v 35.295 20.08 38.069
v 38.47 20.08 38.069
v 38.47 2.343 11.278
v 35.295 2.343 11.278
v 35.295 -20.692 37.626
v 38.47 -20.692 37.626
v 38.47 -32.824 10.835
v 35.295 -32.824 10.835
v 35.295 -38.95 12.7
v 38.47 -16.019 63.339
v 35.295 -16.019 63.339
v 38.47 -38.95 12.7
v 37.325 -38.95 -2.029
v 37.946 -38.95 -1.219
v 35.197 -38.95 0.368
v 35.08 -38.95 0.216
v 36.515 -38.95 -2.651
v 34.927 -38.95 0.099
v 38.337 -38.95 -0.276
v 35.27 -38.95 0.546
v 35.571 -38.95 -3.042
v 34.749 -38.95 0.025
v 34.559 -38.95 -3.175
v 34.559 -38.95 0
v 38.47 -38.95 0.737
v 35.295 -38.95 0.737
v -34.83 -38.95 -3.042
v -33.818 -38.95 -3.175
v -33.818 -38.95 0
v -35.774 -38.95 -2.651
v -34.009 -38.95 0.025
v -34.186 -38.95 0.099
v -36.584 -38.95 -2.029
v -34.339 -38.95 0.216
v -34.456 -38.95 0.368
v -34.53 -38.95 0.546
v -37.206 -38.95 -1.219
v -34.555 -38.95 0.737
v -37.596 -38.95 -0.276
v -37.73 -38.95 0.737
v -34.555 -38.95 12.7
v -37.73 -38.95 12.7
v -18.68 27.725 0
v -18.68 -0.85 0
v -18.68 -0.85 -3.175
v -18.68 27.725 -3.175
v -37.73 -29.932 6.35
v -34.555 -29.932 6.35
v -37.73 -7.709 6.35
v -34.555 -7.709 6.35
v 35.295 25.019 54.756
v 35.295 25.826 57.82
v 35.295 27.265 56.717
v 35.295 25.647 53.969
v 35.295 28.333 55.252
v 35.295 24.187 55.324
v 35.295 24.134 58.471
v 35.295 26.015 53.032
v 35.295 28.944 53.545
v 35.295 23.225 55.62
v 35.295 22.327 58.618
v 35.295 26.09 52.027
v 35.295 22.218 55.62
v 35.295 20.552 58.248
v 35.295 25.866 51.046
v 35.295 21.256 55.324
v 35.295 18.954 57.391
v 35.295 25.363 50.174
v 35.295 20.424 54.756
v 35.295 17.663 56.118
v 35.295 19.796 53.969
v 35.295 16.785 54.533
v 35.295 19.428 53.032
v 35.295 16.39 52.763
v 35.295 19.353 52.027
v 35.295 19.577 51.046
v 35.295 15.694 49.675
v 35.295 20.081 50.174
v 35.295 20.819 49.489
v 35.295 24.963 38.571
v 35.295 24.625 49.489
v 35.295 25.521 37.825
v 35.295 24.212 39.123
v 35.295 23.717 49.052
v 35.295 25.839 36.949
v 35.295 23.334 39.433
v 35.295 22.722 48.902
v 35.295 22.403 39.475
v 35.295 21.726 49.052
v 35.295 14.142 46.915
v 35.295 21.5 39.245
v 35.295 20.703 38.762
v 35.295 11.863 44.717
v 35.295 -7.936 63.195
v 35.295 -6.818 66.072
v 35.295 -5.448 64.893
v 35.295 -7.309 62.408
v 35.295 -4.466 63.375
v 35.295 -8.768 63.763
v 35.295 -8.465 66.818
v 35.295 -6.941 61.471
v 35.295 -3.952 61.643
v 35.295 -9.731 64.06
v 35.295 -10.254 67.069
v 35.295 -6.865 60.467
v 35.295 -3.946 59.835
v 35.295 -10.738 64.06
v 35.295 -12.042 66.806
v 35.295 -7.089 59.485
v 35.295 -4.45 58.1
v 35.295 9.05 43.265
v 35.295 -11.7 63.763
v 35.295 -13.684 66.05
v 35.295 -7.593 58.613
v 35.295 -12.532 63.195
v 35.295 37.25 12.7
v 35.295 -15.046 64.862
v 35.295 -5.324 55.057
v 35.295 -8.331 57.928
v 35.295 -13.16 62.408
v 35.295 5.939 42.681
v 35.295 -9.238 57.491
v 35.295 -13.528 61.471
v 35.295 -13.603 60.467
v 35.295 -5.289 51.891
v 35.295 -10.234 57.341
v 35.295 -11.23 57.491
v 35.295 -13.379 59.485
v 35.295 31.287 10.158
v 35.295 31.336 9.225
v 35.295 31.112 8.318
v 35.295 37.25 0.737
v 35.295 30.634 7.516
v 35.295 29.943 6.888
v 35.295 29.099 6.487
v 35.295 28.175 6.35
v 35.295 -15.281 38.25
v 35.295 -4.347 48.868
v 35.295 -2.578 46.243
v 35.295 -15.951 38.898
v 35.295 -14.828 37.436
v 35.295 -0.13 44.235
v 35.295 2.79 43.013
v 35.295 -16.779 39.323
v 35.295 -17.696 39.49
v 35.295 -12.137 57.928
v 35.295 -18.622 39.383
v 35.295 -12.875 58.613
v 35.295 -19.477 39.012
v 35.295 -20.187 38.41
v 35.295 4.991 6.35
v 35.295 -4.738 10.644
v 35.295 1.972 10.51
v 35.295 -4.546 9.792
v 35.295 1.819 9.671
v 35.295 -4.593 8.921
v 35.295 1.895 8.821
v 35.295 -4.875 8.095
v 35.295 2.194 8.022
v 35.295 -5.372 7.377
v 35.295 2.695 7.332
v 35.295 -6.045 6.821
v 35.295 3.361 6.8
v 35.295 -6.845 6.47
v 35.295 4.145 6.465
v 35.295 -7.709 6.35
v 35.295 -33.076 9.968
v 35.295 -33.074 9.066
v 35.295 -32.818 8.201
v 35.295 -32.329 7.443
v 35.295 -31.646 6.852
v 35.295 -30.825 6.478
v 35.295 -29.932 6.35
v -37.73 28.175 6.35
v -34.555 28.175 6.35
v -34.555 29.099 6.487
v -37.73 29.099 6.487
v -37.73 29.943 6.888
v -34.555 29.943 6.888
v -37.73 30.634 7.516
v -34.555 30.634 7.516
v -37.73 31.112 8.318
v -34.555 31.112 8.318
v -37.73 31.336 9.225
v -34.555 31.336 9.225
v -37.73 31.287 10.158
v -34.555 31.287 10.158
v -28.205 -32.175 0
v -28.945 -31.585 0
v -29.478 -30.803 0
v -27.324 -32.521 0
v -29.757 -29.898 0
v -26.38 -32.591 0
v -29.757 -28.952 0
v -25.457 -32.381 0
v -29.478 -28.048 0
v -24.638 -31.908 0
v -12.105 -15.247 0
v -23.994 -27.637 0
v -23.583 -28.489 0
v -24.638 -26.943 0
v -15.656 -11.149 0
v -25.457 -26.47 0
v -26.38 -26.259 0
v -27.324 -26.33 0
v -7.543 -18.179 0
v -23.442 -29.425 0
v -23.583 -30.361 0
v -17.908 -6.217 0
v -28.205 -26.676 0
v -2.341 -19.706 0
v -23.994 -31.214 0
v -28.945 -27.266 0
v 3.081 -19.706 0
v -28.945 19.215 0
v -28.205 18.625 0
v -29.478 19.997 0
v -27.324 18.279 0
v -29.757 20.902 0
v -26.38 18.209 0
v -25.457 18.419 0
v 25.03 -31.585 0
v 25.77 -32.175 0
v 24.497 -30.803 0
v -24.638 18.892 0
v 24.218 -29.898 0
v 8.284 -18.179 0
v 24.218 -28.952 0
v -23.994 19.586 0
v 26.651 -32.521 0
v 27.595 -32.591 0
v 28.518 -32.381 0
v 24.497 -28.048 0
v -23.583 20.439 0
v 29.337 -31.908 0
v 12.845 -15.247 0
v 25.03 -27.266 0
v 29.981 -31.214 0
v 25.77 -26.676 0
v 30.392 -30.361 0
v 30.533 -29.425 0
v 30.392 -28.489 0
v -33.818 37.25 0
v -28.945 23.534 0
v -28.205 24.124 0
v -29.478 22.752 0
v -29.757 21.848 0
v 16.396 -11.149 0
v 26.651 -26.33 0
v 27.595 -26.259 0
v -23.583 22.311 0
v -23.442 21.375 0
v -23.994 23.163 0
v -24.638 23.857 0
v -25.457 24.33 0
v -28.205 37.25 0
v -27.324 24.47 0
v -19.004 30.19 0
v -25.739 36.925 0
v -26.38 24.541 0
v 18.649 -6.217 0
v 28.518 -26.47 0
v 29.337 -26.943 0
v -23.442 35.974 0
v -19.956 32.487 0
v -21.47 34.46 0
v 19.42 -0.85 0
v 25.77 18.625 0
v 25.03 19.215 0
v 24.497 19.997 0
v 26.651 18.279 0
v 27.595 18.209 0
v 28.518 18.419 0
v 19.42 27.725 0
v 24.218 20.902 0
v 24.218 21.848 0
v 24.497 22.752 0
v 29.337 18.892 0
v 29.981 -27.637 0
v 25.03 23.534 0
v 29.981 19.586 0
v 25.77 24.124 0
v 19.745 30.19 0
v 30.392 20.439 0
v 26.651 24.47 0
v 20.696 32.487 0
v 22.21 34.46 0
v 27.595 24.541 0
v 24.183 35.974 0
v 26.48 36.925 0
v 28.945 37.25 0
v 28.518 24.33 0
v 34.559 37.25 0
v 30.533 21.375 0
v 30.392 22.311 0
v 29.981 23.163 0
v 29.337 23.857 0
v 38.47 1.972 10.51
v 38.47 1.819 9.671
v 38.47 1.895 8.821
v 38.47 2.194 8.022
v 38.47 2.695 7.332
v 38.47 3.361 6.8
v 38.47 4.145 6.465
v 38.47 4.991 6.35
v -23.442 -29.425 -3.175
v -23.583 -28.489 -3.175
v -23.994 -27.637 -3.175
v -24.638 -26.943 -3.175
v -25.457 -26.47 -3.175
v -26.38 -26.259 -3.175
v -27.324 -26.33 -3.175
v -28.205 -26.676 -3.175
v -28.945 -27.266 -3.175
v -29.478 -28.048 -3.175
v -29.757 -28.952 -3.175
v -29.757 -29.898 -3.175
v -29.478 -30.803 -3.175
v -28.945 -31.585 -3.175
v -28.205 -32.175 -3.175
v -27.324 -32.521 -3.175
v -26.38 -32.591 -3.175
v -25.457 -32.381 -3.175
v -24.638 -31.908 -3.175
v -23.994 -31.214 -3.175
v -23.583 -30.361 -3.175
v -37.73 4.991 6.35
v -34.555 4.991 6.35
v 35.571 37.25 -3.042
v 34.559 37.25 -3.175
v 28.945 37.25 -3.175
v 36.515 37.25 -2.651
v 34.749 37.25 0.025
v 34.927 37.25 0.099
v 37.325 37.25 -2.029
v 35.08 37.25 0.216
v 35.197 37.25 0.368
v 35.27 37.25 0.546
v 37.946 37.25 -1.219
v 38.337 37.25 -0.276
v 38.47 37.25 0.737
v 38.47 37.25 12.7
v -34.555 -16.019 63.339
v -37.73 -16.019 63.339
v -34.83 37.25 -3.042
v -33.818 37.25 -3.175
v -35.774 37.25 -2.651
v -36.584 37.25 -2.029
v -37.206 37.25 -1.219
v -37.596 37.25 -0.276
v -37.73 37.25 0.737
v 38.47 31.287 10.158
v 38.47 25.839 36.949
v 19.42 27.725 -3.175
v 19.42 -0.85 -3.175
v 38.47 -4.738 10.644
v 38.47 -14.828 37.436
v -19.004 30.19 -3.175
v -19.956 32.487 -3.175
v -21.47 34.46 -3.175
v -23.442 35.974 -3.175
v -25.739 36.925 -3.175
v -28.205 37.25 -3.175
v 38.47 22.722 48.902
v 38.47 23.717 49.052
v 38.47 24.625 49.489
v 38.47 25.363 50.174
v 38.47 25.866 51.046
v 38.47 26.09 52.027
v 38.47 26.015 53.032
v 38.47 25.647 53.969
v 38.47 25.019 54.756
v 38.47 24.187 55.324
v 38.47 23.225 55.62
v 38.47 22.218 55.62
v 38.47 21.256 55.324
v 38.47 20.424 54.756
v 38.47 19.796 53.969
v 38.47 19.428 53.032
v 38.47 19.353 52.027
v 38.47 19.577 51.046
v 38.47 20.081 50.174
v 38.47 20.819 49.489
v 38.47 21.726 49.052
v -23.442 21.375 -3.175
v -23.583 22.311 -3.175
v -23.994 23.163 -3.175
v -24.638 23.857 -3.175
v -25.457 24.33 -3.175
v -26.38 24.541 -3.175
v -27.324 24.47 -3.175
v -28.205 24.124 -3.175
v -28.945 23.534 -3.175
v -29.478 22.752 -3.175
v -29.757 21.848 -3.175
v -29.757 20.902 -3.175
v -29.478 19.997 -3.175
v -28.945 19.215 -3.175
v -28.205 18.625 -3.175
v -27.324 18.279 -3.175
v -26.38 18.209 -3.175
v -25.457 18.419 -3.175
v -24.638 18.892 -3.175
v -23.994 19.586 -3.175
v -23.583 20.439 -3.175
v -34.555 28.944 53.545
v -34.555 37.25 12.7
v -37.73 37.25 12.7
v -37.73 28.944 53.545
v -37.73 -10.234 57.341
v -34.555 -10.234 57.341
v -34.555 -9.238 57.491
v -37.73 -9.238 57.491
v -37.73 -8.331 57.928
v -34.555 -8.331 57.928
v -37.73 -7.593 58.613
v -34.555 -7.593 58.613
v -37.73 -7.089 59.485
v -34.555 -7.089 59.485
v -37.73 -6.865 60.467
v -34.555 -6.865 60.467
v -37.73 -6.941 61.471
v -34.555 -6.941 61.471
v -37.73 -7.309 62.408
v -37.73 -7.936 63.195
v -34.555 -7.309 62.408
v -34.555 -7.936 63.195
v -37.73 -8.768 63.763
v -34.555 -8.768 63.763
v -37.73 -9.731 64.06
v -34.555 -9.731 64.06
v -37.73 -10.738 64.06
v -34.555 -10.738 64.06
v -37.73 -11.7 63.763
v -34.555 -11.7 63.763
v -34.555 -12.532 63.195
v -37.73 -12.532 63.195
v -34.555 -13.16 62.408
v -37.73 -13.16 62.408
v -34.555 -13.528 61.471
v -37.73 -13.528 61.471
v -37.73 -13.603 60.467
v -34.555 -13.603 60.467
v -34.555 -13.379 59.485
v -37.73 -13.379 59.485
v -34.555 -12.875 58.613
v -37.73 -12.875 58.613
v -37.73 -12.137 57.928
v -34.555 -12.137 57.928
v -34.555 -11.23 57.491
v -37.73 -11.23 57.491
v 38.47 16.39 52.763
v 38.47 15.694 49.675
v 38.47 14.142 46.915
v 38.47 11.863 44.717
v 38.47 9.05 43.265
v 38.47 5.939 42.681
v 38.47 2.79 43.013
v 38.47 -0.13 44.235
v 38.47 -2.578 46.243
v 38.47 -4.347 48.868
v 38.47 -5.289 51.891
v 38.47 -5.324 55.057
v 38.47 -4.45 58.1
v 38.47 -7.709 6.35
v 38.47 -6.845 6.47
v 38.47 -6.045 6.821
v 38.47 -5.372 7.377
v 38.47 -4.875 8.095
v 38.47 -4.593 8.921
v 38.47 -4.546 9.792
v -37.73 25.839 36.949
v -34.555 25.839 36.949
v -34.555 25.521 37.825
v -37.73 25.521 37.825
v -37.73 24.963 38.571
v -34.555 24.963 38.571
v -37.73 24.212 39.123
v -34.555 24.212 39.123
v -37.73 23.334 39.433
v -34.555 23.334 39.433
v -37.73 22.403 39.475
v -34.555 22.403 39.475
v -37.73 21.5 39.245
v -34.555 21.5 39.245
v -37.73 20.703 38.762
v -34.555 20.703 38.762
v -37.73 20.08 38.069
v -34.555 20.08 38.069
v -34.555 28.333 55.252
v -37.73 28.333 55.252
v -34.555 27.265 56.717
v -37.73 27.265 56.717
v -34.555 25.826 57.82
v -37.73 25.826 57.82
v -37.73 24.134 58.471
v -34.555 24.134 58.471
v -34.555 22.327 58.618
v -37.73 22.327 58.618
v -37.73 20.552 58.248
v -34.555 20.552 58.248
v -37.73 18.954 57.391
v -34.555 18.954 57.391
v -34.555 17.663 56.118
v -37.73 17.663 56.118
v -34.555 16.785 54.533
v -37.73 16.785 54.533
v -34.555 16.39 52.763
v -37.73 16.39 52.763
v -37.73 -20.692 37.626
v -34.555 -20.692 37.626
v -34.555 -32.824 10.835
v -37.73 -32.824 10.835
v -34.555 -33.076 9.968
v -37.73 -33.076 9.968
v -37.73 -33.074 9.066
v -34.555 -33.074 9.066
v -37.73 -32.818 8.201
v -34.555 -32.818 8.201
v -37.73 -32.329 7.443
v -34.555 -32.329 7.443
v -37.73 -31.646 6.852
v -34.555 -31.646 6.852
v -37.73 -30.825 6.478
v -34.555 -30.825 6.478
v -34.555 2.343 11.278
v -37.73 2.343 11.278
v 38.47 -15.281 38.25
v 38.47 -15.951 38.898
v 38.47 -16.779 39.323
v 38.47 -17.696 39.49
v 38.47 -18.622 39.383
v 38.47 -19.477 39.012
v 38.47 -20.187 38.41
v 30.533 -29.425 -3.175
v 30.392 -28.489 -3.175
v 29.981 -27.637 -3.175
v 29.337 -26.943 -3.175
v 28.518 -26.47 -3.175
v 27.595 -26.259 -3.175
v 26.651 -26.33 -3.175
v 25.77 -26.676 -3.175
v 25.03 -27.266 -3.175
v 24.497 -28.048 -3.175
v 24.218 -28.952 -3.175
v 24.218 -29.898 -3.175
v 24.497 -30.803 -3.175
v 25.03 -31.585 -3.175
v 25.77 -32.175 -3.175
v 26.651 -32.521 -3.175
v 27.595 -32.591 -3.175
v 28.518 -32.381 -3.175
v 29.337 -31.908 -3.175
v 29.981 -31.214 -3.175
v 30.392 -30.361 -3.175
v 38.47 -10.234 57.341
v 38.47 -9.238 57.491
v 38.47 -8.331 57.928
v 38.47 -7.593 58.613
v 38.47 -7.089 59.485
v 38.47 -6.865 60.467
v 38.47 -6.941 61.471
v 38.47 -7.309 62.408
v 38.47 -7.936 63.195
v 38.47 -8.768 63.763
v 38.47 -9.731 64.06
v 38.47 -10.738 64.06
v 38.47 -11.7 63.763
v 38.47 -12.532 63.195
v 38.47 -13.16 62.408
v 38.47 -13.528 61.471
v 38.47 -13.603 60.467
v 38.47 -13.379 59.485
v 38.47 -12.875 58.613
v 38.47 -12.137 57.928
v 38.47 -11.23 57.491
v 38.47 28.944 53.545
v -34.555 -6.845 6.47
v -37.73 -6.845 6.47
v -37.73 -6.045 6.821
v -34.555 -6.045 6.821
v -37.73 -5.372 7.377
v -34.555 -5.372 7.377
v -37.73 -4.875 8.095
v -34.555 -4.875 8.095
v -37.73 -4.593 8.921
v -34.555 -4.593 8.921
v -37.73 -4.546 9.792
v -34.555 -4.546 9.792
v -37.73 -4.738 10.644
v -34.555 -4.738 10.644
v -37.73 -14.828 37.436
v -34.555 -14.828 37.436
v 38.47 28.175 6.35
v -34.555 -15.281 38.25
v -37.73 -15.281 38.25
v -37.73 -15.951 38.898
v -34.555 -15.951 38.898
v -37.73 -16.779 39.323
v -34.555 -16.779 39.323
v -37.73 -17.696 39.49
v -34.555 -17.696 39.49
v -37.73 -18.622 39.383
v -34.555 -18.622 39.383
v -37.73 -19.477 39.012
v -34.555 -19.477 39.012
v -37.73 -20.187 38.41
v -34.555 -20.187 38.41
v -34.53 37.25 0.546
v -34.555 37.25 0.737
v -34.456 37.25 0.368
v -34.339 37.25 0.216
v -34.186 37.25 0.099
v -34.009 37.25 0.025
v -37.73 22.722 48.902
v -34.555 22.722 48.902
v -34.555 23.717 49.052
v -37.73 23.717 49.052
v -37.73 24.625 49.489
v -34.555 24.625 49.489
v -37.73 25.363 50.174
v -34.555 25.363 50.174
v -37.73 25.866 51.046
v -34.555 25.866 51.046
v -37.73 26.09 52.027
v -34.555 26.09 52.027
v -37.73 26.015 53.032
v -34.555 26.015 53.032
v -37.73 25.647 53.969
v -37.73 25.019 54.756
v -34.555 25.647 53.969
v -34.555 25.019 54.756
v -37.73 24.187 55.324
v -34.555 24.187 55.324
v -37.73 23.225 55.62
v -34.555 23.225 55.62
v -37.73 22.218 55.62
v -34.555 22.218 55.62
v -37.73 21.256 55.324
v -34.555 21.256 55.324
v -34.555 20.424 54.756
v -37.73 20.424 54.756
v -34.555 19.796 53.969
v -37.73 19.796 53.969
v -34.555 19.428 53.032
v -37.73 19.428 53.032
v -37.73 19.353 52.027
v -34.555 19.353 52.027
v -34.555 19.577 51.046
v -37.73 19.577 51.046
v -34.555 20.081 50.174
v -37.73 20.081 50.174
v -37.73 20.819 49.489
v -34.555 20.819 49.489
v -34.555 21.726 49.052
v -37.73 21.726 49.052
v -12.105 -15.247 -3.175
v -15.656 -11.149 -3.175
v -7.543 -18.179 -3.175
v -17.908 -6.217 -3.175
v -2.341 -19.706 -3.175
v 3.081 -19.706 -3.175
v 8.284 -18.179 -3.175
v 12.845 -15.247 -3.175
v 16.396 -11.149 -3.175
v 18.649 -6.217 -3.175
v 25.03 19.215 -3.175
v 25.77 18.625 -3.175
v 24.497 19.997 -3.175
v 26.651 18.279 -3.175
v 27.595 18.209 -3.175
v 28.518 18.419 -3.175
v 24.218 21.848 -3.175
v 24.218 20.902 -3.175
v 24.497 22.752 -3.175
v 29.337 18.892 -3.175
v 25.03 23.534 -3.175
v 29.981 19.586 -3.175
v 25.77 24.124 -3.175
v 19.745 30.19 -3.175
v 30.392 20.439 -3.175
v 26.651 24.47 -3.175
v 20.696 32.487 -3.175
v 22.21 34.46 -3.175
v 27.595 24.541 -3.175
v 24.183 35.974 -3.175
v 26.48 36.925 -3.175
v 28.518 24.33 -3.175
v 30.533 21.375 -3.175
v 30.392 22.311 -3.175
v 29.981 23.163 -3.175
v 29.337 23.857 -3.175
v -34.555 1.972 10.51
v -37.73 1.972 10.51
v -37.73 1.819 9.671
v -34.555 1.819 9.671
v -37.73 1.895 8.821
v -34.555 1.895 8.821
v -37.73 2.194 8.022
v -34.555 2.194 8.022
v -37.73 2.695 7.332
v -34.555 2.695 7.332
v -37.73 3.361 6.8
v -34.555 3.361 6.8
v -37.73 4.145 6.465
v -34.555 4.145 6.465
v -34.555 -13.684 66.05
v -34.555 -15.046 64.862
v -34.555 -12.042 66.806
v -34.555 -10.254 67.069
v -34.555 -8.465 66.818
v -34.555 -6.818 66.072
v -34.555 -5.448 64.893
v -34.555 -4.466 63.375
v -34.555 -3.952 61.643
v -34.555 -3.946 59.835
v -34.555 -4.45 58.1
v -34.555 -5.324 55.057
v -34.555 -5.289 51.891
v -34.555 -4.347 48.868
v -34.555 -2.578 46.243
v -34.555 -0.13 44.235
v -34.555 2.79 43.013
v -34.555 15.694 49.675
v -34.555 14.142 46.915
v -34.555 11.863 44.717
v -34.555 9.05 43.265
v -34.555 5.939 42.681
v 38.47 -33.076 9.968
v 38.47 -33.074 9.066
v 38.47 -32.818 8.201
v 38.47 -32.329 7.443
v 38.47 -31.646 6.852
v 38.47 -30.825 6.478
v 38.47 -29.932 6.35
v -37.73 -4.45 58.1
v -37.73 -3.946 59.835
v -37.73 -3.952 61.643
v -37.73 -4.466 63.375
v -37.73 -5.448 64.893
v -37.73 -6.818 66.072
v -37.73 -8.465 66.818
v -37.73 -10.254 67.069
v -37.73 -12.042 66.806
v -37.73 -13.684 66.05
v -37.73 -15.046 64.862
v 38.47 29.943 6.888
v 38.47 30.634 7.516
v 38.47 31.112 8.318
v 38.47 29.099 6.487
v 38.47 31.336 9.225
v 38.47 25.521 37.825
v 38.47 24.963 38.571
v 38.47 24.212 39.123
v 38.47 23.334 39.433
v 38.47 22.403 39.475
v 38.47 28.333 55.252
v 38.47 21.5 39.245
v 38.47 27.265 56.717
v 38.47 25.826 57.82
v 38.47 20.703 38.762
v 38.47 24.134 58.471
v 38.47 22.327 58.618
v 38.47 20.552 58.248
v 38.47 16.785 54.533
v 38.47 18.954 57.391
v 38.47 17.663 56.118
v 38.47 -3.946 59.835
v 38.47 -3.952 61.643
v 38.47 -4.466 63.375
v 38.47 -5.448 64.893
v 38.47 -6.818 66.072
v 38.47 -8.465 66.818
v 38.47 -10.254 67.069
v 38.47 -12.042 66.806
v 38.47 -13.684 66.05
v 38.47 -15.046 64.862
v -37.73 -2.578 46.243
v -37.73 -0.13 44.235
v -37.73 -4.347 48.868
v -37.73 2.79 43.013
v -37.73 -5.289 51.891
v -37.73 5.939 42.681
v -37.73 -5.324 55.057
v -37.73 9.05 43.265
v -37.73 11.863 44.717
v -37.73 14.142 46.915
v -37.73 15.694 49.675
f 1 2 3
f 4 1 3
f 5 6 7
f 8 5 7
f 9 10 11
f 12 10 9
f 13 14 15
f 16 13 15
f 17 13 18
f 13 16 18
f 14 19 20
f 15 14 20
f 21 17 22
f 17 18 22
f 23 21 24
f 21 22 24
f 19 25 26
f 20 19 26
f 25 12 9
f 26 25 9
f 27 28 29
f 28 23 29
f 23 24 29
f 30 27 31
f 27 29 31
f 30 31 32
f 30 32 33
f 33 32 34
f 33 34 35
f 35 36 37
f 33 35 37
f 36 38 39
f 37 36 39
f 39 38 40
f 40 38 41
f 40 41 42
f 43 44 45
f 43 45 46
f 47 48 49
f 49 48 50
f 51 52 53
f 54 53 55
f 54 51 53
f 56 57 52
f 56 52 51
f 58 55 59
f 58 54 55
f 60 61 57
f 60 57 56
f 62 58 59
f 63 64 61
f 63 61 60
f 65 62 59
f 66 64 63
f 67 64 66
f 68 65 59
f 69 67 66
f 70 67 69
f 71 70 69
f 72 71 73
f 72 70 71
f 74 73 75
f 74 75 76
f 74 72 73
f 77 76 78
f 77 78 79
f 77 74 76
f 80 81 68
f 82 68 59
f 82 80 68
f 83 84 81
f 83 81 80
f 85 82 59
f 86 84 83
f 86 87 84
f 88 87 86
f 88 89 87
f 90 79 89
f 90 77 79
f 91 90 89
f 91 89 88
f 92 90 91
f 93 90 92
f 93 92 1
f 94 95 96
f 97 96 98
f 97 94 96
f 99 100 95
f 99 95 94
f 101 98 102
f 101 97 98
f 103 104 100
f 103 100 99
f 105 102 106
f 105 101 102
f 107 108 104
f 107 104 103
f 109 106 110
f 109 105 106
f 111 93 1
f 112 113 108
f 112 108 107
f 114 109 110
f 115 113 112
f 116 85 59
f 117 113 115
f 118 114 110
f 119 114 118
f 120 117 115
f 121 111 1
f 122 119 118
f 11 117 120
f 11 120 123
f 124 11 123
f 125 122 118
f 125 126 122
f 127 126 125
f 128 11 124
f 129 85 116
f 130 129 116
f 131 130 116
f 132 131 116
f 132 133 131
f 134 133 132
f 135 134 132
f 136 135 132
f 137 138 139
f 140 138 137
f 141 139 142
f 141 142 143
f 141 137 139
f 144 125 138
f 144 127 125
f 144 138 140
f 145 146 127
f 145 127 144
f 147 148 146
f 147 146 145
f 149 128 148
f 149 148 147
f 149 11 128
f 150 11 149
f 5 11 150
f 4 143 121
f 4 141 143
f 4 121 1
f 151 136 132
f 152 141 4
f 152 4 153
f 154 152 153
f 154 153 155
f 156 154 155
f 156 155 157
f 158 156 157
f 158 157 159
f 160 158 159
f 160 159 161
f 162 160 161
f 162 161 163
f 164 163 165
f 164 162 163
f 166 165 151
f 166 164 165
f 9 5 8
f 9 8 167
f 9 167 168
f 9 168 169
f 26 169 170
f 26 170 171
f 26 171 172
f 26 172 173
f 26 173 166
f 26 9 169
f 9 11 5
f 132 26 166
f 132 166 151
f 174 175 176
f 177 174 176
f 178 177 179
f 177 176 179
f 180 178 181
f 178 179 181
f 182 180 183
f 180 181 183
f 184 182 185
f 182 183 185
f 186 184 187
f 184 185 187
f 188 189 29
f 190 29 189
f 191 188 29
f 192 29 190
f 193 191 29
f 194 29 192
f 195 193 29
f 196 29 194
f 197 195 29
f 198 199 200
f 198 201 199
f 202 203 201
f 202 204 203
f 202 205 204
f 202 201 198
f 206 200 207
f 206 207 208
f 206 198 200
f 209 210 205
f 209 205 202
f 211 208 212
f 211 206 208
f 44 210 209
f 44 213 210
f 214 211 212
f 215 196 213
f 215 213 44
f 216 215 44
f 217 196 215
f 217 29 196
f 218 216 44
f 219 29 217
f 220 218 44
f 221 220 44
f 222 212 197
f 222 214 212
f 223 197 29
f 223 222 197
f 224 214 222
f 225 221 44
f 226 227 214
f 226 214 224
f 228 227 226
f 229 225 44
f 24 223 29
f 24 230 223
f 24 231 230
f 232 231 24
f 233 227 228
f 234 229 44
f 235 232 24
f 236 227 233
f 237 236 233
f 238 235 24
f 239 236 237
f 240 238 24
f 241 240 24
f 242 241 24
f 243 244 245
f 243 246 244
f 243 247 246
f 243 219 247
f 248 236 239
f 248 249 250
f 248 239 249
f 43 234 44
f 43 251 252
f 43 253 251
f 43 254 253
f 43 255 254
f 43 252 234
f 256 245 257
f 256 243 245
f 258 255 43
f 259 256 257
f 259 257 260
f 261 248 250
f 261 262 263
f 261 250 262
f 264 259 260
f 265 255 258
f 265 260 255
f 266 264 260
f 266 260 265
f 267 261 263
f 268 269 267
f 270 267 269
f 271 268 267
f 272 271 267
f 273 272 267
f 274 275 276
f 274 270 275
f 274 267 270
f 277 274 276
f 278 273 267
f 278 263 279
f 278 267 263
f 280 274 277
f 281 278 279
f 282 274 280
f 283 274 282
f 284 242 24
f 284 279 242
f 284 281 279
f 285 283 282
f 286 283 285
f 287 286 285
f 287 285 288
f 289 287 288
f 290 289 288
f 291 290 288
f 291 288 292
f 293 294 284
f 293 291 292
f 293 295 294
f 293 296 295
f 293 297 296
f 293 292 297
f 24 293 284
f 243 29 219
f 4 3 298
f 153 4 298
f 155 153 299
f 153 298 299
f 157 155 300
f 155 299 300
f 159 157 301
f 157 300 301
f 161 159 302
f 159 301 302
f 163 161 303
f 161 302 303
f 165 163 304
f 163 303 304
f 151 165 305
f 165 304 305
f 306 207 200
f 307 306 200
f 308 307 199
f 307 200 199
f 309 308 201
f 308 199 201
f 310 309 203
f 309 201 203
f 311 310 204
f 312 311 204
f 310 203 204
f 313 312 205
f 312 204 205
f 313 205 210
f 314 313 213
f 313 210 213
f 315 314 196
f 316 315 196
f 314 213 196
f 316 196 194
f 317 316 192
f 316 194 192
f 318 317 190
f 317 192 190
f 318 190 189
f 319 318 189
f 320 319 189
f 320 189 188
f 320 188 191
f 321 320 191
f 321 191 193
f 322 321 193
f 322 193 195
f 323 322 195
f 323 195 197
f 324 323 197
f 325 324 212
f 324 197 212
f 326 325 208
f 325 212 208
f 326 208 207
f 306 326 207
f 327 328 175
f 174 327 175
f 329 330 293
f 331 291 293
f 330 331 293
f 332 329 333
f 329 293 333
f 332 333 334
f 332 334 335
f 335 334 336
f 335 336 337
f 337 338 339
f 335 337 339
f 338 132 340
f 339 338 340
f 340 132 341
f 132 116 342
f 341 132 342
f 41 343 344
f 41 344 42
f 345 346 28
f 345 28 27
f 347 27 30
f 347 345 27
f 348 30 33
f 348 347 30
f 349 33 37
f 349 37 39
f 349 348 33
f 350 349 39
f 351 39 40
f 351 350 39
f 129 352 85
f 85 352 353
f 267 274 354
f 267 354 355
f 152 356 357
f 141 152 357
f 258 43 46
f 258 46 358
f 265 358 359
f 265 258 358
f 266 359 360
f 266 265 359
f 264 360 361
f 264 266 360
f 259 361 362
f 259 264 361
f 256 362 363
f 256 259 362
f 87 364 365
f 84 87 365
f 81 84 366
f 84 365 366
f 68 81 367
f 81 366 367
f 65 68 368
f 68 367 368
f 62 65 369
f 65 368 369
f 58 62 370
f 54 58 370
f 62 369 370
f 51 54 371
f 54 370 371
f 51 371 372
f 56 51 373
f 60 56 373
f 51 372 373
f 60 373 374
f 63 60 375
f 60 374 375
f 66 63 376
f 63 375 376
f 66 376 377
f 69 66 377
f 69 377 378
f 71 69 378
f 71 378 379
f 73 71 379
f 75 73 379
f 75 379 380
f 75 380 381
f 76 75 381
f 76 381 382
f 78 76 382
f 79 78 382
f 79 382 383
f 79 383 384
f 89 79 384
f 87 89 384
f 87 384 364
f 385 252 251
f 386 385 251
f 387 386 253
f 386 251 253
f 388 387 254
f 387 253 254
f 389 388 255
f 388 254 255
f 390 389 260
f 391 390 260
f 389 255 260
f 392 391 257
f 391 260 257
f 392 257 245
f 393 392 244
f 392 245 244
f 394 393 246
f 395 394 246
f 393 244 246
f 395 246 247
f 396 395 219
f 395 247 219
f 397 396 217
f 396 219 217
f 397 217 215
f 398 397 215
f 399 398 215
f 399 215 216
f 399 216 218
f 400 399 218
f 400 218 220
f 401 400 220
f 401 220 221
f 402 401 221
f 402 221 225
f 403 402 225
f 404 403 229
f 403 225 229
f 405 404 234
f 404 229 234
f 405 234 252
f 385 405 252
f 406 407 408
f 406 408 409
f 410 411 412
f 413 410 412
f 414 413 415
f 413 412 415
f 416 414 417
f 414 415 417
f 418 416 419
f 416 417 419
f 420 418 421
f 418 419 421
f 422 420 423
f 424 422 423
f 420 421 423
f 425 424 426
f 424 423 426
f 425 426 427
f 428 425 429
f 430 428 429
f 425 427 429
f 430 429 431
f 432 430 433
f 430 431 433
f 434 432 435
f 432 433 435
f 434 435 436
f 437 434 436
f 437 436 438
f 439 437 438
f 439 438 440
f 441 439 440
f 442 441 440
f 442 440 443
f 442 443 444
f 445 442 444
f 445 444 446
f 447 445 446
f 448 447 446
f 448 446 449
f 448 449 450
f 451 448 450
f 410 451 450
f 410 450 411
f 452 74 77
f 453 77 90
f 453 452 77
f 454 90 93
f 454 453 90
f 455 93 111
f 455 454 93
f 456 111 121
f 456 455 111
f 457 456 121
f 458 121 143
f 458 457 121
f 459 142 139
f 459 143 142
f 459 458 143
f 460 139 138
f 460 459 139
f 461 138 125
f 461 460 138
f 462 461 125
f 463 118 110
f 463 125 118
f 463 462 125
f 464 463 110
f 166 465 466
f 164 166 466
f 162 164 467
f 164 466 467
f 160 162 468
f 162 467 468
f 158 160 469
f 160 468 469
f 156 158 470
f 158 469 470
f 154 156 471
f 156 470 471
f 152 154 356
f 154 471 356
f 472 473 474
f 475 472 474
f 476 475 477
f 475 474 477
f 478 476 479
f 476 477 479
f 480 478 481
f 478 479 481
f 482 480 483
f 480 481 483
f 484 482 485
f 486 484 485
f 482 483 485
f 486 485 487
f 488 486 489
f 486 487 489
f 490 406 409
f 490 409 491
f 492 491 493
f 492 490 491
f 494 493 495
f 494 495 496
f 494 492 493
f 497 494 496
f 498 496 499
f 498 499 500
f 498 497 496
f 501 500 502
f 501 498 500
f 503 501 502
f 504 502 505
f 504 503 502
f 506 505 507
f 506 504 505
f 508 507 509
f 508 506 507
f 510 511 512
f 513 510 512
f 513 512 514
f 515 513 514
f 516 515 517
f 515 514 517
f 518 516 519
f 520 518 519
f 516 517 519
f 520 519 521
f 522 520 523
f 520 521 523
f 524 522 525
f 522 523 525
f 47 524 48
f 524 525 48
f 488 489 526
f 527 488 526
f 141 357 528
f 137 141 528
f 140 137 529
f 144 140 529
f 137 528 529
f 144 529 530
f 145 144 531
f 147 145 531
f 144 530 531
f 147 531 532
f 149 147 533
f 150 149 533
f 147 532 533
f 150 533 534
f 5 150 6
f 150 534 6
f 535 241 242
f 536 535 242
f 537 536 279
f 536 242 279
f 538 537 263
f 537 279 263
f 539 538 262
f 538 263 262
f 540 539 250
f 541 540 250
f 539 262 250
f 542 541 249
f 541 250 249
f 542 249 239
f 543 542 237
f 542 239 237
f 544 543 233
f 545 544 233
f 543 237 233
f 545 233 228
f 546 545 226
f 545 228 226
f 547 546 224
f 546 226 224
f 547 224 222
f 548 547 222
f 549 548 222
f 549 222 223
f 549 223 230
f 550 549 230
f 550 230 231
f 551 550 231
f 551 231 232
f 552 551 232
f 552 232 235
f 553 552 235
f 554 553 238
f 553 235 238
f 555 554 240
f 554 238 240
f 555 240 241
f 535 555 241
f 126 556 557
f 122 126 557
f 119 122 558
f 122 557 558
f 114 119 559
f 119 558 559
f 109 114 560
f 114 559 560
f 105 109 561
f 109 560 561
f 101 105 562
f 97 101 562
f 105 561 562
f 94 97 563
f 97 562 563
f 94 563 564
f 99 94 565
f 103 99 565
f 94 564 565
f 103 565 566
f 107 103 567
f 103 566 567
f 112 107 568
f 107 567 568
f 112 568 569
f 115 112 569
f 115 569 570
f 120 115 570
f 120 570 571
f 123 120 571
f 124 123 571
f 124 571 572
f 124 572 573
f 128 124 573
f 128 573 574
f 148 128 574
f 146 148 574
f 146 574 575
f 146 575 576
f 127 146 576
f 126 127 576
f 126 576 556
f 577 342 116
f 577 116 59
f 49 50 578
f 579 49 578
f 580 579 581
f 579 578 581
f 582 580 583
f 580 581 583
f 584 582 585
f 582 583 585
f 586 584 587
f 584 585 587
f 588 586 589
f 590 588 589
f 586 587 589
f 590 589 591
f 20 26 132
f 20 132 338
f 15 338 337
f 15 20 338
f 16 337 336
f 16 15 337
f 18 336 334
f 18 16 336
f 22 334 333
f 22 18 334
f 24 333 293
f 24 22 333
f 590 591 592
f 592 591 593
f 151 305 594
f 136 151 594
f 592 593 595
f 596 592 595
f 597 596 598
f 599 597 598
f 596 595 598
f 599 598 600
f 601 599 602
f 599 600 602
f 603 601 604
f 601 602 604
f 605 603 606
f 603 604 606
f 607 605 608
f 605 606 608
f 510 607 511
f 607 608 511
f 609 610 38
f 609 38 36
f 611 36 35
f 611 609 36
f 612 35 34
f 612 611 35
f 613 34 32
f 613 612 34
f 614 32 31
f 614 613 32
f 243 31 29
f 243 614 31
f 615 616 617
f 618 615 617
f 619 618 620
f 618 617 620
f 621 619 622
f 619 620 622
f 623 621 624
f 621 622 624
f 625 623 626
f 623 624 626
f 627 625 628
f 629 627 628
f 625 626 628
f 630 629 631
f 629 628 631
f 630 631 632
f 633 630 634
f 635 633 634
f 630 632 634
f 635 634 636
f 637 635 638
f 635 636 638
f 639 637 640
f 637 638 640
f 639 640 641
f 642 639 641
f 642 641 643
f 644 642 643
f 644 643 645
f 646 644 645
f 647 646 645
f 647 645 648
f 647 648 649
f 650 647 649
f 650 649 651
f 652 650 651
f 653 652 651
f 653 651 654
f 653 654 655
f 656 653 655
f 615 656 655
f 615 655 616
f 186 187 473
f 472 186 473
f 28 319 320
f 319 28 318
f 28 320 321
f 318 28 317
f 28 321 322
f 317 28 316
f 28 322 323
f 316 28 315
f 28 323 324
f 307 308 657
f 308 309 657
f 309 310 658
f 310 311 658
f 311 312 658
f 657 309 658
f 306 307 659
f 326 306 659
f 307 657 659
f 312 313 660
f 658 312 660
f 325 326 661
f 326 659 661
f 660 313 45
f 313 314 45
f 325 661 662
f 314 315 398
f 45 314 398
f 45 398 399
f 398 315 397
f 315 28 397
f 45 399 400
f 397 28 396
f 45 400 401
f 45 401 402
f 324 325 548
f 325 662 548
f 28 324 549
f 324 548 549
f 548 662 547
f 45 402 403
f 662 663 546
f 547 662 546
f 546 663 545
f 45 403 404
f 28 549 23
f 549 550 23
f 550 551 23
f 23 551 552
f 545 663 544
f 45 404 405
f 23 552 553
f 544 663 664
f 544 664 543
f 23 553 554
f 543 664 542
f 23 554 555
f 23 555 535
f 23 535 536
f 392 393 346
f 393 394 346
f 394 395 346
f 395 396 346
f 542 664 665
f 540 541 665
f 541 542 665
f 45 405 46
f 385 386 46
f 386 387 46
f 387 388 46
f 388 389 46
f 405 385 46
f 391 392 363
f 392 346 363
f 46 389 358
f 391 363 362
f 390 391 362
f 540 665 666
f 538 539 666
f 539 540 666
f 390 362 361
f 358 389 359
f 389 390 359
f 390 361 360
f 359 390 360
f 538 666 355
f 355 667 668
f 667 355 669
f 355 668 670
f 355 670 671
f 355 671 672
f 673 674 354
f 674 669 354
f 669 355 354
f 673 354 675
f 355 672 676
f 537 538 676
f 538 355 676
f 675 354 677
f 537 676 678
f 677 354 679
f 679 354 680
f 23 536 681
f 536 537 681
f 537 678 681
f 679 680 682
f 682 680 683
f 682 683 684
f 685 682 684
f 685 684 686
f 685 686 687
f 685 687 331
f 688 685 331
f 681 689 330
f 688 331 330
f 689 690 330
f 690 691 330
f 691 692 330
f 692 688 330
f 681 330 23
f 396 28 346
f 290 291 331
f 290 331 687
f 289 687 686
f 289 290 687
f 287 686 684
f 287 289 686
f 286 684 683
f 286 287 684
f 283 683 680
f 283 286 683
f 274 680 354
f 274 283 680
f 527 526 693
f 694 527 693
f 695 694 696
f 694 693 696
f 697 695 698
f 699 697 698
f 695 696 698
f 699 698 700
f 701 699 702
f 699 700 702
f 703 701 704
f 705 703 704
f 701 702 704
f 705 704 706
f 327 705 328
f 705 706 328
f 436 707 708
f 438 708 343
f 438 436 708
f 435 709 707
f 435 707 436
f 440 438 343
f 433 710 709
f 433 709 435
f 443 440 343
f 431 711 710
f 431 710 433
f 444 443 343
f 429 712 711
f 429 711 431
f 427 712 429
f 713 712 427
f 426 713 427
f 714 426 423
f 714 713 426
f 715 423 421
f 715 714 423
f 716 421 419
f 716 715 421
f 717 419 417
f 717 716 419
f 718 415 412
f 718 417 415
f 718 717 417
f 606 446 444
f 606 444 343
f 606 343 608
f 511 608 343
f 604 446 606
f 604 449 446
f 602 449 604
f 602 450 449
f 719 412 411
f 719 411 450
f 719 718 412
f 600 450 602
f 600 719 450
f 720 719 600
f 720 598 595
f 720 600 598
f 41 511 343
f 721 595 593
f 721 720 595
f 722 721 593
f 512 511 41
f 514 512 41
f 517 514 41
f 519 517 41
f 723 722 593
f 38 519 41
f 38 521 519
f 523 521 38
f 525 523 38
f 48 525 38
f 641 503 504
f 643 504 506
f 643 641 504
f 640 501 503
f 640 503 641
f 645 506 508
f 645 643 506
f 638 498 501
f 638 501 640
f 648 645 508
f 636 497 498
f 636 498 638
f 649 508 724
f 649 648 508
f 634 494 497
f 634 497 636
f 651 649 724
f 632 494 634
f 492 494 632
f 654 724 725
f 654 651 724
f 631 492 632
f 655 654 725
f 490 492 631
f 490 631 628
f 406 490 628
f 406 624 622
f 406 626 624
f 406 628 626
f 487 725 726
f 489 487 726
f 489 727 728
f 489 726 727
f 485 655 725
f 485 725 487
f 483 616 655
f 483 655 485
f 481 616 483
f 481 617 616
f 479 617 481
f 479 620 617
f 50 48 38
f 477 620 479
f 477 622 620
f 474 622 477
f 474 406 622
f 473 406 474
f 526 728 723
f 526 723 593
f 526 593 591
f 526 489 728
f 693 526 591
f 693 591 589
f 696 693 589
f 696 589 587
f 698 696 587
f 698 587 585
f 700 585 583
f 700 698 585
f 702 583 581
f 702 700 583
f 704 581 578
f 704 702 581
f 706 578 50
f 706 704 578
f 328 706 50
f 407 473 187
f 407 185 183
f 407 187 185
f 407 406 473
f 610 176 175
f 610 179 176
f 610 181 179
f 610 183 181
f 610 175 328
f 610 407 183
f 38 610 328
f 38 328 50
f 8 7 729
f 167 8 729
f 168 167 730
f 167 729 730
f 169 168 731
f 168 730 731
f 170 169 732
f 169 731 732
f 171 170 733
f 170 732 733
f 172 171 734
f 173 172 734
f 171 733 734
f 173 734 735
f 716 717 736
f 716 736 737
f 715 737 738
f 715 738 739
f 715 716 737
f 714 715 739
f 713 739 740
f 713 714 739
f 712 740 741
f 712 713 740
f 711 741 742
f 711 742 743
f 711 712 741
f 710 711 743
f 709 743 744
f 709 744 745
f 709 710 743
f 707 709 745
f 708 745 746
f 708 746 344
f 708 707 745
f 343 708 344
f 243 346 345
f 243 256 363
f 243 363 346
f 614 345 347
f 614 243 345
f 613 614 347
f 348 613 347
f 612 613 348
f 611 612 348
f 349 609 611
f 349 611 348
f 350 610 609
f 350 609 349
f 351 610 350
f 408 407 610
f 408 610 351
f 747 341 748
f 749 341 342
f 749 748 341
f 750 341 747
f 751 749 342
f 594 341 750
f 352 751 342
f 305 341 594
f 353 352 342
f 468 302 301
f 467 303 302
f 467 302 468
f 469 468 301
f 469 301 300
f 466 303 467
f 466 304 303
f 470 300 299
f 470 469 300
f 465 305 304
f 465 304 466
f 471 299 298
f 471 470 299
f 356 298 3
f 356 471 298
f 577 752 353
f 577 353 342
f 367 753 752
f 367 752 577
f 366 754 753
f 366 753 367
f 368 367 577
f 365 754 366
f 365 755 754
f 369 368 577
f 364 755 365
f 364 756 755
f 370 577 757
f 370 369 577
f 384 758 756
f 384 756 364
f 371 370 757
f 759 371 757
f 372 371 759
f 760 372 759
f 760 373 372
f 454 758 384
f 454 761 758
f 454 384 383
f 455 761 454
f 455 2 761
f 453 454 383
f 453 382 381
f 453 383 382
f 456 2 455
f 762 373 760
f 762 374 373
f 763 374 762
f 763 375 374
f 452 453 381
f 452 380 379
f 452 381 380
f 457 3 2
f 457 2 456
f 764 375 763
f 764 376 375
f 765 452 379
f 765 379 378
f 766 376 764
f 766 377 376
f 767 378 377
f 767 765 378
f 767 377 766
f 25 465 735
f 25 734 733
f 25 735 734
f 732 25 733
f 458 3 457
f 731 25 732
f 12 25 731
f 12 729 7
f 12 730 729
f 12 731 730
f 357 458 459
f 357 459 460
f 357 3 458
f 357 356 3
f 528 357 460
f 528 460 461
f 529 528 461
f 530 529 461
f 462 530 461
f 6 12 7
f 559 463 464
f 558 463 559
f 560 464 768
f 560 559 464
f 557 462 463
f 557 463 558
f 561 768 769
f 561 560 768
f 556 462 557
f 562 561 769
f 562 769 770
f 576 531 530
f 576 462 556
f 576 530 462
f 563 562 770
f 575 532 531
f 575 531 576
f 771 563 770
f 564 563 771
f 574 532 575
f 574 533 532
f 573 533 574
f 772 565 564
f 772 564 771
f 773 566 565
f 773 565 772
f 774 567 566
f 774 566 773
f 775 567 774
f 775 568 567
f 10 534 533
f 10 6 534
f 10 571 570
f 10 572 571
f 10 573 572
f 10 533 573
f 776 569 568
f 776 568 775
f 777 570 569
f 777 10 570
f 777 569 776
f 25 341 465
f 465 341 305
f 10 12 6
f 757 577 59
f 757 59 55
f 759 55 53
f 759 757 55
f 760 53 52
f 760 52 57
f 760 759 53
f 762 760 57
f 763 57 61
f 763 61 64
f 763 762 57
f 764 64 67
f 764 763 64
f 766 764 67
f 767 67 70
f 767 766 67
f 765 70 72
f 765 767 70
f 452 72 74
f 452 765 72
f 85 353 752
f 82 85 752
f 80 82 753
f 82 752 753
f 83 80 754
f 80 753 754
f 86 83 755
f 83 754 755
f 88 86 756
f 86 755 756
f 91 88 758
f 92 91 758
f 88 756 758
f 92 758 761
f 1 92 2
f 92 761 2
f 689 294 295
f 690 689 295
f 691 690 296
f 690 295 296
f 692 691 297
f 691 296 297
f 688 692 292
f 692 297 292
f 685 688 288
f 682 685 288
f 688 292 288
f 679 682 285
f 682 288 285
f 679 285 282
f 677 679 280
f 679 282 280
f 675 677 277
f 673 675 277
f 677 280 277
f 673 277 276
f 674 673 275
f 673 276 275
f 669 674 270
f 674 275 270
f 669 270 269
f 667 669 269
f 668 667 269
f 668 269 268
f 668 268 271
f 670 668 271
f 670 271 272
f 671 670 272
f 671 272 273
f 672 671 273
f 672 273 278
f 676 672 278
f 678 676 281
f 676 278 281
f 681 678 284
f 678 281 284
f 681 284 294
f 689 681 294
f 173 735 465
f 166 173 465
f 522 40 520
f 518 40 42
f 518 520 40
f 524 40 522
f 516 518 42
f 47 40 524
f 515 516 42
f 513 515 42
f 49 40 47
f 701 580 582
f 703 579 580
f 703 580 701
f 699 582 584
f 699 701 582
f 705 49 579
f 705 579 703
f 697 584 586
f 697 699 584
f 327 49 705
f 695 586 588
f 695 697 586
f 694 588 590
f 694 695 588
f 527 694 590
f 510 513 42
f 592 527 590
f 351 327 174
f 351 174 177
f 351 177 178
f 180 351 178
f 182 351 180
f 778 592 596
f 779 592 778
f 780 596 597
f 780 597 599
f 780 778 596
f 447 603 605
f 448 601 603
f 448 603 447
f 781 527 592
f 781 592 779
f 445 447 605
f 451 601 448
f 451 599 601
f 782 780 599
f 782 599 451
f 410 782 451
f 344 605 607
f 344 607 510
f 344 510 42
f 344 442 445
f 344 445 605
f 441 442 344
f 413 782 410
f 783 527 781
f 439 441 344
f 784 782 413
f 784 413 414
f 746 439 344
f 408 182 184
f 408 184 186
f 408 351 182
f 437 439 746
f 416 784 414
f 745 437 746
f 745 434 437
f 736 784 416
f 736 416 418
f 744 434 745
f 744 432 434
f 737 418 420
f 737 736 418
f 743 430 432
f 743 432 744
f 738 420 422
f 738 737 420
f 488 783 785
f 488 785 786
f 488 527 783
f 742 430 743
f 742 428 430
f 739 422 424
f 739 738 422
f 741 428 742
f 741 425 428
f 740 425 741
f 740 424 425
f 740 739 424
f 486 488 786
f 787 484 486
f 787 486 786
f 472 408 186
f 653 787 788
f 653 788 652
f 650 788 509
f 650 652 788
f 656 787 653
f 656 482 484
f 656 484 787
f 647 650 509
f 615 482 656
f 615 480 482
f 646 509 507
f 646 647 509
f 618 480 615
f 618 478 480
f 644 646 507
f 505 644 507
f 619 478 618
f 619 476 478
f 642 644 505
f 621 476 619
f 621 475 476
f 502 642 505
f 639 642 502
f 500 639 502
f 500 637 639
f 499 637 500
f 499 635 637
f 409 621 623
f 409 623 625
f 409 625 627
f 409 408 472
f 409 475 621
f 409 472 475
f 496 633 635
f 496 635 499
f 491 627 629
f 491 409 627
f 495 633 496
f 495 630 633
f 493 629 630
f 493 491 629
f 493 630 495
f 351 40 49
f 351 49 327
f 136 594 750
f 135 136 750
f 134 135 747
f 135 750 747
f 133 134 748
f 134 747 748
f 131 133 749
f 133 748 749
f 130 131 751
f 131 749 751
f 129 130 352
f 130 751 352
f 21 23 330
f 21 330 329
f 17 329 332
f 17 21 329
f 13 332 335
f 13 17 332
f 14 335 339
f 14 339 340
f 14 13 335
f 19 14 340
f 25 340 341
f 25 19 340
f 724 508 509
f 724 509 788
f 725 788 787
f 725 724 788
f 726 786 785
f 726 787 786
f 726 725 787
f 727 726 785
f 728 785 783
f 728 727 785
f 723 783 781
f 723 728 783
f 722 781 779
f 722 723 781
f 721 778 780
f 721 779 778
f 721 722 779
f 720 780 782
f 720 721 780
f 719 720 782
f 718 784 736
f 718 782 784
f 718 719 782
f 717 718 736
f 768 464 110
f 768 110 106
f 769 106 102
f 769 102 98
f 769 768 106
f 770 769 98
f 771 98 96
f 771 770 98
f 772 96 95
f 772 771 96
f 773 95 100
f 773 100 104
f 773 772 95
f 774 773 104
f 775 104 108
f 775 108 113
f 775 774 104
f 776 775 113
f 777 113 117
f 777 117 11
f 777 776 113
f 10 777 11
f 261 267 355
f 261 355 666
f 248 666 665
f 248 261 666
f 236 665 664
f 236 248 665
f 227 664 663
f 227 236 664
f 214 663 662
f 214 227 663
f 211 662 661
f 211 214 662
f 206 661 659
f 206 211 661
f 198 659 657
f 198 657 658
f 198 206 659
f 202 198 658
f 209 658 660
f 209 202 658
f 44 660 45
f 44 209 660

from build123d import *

# Parameters (mm, degrees)
SKETCH4_R                      = 3.175
BASE_FLANGE1_DEPTH             = 3.175
EDGE_FLANGE1_STRIP_W           = 14.1732
EDGE_FLANGE1_STRIP_H           = 3.175
EDGE_FLANGE1_STRIP_CUT_DEPTH   = 76.2
EDGE_FLANGE1_STRIP_2_W         = 14.1732
EDGE_FLANGE1_STRIP_2_H         = 3.175
EDGE_FLANGE1_STRIP_CUT_2_DEPTH = 76.2
EDGE_FLANGE1_DEPTH             = 76.2
EDGE_FLANGE1_BEND_DEPTH        = 76.2
CUT_EXTRUDE2_DEPTH             = 113.499830191
CUT_EXTRUDE3_REACH             = 110.728
SKETCH21_R                     = 3.3782


# Sheet-metal steps are written as plain solids
with BuildPart() as part:
    # Sketch4 → Base-Flange1 (new body)
    with BuildSketch(Plane.XY):
        with BuildLine():
            Line((38.470301513, 37.249760359), (28.945301513, 37.249760359))
            ThreePointArc((28.945301513, 37.249760359), (22.210109423, 34.45995245), (19.420301513, 27.724760359))
            Line((19.420301513, 27.724760359), (19.420301513, -0.850239641))
            ThreePointArc((19.420301513, -0.850239641), (0.370301513, -19.900239641), (-18.679698487, -0.850239641))
            Line((-18.679698487, -0.850239641), (-18.679698487, 27.724760359))
            ThreePointArc((-18.679698487, 27.724760359), (-21.469506396, 34.45995245), (-28.204698487, 37.249760359))
            Line((-28.204698487, 37.249760359), (-37.729698487, 37.249760359))
            Line((-37.729698487, 37.249760359), (-37.729698487, -38.950239641))
            Line((-37.729698487, -38.950239641), (38.470301513, -38.950239641))
            Line((38.470301513, -38.950239641), (38.470301513, 37.249760359))
        make_face()
        with Locations((-26.617198487, -29.425239641)):
            Circle(SKETCH4_R, mode=Mode.SUBTRACT)
        with Locations((27.357801513, -29.425239641)):
            Circle(SKETCH4_R, mode=Mode.SUBTRACT)
        with Locations((27.357801513, 21.374760359)):
            Circle(SKETCH4_R, mode=Mode.SUBTRACT)
        with Locations((-26.617198487, 21.374760359)):
            Circle(SKETCH4_R, mode=Mode.SUBTRACT)
    extrude(amount=-BASE_FLANGE1_DEPTH)

    # Edge-Flange1 strip (across the edge) → Edge-Flange1 strip cut (cut)
    with BuildSketch(Plane(origin=(38.470301513, -38.950239641, 0), x_dir=(-1, 0, 0), z_dir=(0, 1, 0))):
        with Locations((-3.175, -1.5875)):
            Rectangle(EDGE_FLANGE1_STRIP_W, EDGE_FLANGE1_STRIP_H)
    extrude(amount=EDGE_FLANGE1_STRIP_CUT_DEPTH, mode=Mode.SUBTRACT)

    # Edge-Flange1 strip 2 (across the edge) → Edge-Flange1 strip cut 2 (cut)
    with BuildSketch(Plane(origin=(-37.729698487, 37.249760359, 0), x_dir=(1, 0, 0), z_dir=(0, -1, 0))):
        with Locations((-3.175, -1.5875)):
            Rectangle(EDGE_FLANGE1_STRIP_2_W, EDGE_FLANGE1_STRIP_2_H)
    extrude(amount=EDGE_FLANGE1_STRIP_CUT_2_DEPTH, mode=Mode.SUBTRACT)

    # Edge-Flange1 section (across the edge) → Edge-Flange1 (add)
    with BuildSketch(Plane(origin=(38.470301513, -38.950239641, 0), x_dir=(-1, 0, 0), z_dir=(0, 1, 0))):
        with BuildLine():
            Line((0, 0.7366), (0, 73.025))
            Line((0, 73.025), (3.175, 73.025))
            Line((3.175, 73.025), (3.175, 0.7366))
            ThreePointArc((3.175, 0.7366), (3.390745145, 0.215745145), (3.9116, 0))
            Line((3.9116, 0), (3.9116, -3.175))
            ThreePointArc((3.9116, -3.175), (1.145681115, -2.029318885), (0, 0.7366))
        make_face()
    extrude(amount=EDGE_FLANGE1_DEPTH)

    # Edge-Flange1 section 2 (across the edge) → Edge-Flange1 bend (add)
    with BuildSketch(Plane(origin=(-37.729698487, 37.249760359, 0), x_dir=(1, 0, 0), z_dir=(0, -1, 0))):
        with BuildLine():
            Line((0, 0.7366), (0, 73.025))
            Line((0, 73.025), (3.175, 73.025))
            Line((3.175, 73.025), (3.175, 0.7366))
            ThreePointArc((3.175, 0.7366), (3.390745145, 0.215745145), (3.9116, 0))
            Line((3.9116, 0), (3.9116, -3.175))
            ThreePointArc((3.9116, -3.175), (1.145681115, -2.029318885), (0, 0.7366))
        make_face()
    extrude(amount=EDGE_FLANGE1_BEND_DEPTH)

    # Sketch18 → Cut-Extrude2 (cut, through all)
    with BuildSketch(Plane(origin=(38.470301513, 0, 0), x_dir=(0, 0, -1), z_dir=(1, 0, 0))):
        with BuildLine():
            Line((-12.7, 37.249760359), (-53.545242344, 28.944361059))
            ThreePointArc((-53.545242344, 28.944361059), (-58.617648241, 22.326829154), (-52.763048756, 16.390104891))
            ThreePointArc((-52.763048756, 16.390104891), (-43.013397441, 2.790344649), (-58.09955595, -4.449613972))
            ThreePointArc((-58.09955595, -4.449613972), (-66.503585183, -7.614624659), (-63.338574497, -16.018653892))
            Line((-63.338574497, -16.018653892), (-12.7, -38.950239641))
            Line((-12.7, -38.950239641), (-73.025, -38.950239641))
            Line((-73.025, -38.950239641), (-73.025, 37.249760359))
            Line((-73.025, 37.249760359), (-12.7, 37.249760359))
        make_face()
    extrude(amount=-CUT_EXTRUDE2_DEPTH, mode=Mode.SUBTRACT)

    # Cut-Extrude3: up to this face of the body (flat: up to its plane)
    cut_extrude3_end = Plane(part.part.faces().sort_by_distance((-37.729698487, 0.375360162, 25.894827333))[0])
    # Sketch21 → Cut-Extrude3 (cut, up to the picked face)
    with BuildSketch(Plane(origin=(38.470301513, 0, 0), x_dir=(0, 0, -1), z_dir=(1, 0, 0)), mode=Mode.PRIVATE) as cut_extrude3_sk1:
        with Locations((-60.719065223, -10.234133932)):
            Circle(SKETCH21_R)
    cut_extrude3_tool1 = split(extrude(cut_extrude3_sk1.sketch, amount=-CUT_EXTRUDE3_REACH, mode=Mode.PRIVATE), bisect_by=cut_extrude3_end, keep=Keep.BOTH, mode=Mode.PRIVATE)
    # Sketch21 → Cut-Extrude3 (cut, up to the picked face)
    with BuildSketch(Plane(origin=(38.470301513, 0, 0), x_dir=(0, 0, -1), z_dir=(1, 0, 0)), mode=Mode.PRIVATE) as cut_extrude3_sk2:
        with Locations((-52.279937568, 22.721700549)):
            Circle(SKETCH21_R)
    cut_extrude3_tool2 = split(extrude(cut_extrude3_sk2.sketch, amount=-CUT_EXTRUDE3_REACH, mode=Mode.PRIVATE), bisect_by=cut_extrude3_end, keep=Keep.BOTH, mode=Mode.PRIVATE)
    # Sketch21 → Cut-Extrude3 (cut, up to the picked face)
    with BuildSketch(Plane(origin=(38.470301513, 0, 0), x_dir=(0, 0, -1), z_dir=(1, 0, 0)), mode=Mode.PRIVATE) as cut_extrude3_sk3:
        with BuildLine():
            Line((-10.64400026, -4.738220863), (-37.435582613, -14.828100623))
            ThreePointArc((-37.435582613, -14.828100623), (-39.489903551, -17.696138128), (-37.62633699, -20.691633633))
            Line((-37.62633699, -20.691633633), (-10.834754637, -32.824152651))
            ThreePointArc((-10.834754637, -32.824152651), (-7.804221974, -32.600140782), (-6.35, -29.931892671))
            Line((-6.35, -29.931892671), (-6.35, -7.709493893))
            ThreePointArc((-6.35, -7.709493893), (-7.718373423, -5.09860795), (-10.64400026, -4.738220863))
        make_face()
    cut_extrude3_tool3 = split(extrude(cut_extrude3_sk3.sketch, amount=-CUT_EXTRUDE3_REACH, mode=Mode.PRIVATE), bisect_by=cut_extrude3_end, keep=Keep.BOTH, mode=Mode.PRIVATE)
    # Sketch21 → Cut-Extrude3 (cut, up to the picked face)
    with BuildSketch(Plane(origin=(38.470301513, 0, 0), x_dir=(0, 0, -1), z_dir=(1, 0, 0)), mode=Mode.PRIVATE) as cut_extrude3_sk4:
        with BuildLine():
            Line((-38.069272281, 20.080292762), (-11.277689928, 2.343110591))
            ThreePointArc((-11.277689928, 2.343110591), (-8.022363238, 2.193595711), (-6.35, 4.990506107))
            Line((-6.35, 4.990506107), (-6.35, 28.175441224))
            ThreePointArc((-6.35, 28.175441224), (-7.516025925, 30.634027844), (-10.157652388, 31.286771479))
            Line((-10.157652388, 31.286771479), (-36.949234742, 25.839018533))
            ThreePointArc((-36.949234742, 25.839018533), (-39.433182282, 23.333848227), (-38.069272281, 20.080292762))
        make_face()
    cut_extrude3_tool4 = split(extrude(cut_extrude3_sk4.sketch, amount=-CUT_EXTRUDE3_REACH, mode=Mode.PRIVATE), bisect_by=cut_extrude3_end, keep=Keep.BOTH, mode=Mode.PRIVATE)
    add(cut_extrude3_tool1.solids().sort_by(Axis((38.470302, -10.234134, 60.719065), (-1, 0, 0)))[0], mode=Mode.SUBTRACT)
    add(cut_extrude3_tool2.solids().sort_by(Axis((38.470302, 22.721701, 52.279938), (-1, 0, 0)))[0], mode=Mode.SUBTRACT)
    add(cut_extrude3_tool3.solids().sort_by(Axis((38.470302, -18.49522, 18.845957), (-1, 0, 0)))[0], mode=Mode.SUBTRACT)
    add(cut_extrude3_tool4.solids().sort_by(Axis((38.470302, 18.532132, 18.821153), (-1, 0, 0)))[0], mode=Mode.SUBTRACT)


solid = part.part
